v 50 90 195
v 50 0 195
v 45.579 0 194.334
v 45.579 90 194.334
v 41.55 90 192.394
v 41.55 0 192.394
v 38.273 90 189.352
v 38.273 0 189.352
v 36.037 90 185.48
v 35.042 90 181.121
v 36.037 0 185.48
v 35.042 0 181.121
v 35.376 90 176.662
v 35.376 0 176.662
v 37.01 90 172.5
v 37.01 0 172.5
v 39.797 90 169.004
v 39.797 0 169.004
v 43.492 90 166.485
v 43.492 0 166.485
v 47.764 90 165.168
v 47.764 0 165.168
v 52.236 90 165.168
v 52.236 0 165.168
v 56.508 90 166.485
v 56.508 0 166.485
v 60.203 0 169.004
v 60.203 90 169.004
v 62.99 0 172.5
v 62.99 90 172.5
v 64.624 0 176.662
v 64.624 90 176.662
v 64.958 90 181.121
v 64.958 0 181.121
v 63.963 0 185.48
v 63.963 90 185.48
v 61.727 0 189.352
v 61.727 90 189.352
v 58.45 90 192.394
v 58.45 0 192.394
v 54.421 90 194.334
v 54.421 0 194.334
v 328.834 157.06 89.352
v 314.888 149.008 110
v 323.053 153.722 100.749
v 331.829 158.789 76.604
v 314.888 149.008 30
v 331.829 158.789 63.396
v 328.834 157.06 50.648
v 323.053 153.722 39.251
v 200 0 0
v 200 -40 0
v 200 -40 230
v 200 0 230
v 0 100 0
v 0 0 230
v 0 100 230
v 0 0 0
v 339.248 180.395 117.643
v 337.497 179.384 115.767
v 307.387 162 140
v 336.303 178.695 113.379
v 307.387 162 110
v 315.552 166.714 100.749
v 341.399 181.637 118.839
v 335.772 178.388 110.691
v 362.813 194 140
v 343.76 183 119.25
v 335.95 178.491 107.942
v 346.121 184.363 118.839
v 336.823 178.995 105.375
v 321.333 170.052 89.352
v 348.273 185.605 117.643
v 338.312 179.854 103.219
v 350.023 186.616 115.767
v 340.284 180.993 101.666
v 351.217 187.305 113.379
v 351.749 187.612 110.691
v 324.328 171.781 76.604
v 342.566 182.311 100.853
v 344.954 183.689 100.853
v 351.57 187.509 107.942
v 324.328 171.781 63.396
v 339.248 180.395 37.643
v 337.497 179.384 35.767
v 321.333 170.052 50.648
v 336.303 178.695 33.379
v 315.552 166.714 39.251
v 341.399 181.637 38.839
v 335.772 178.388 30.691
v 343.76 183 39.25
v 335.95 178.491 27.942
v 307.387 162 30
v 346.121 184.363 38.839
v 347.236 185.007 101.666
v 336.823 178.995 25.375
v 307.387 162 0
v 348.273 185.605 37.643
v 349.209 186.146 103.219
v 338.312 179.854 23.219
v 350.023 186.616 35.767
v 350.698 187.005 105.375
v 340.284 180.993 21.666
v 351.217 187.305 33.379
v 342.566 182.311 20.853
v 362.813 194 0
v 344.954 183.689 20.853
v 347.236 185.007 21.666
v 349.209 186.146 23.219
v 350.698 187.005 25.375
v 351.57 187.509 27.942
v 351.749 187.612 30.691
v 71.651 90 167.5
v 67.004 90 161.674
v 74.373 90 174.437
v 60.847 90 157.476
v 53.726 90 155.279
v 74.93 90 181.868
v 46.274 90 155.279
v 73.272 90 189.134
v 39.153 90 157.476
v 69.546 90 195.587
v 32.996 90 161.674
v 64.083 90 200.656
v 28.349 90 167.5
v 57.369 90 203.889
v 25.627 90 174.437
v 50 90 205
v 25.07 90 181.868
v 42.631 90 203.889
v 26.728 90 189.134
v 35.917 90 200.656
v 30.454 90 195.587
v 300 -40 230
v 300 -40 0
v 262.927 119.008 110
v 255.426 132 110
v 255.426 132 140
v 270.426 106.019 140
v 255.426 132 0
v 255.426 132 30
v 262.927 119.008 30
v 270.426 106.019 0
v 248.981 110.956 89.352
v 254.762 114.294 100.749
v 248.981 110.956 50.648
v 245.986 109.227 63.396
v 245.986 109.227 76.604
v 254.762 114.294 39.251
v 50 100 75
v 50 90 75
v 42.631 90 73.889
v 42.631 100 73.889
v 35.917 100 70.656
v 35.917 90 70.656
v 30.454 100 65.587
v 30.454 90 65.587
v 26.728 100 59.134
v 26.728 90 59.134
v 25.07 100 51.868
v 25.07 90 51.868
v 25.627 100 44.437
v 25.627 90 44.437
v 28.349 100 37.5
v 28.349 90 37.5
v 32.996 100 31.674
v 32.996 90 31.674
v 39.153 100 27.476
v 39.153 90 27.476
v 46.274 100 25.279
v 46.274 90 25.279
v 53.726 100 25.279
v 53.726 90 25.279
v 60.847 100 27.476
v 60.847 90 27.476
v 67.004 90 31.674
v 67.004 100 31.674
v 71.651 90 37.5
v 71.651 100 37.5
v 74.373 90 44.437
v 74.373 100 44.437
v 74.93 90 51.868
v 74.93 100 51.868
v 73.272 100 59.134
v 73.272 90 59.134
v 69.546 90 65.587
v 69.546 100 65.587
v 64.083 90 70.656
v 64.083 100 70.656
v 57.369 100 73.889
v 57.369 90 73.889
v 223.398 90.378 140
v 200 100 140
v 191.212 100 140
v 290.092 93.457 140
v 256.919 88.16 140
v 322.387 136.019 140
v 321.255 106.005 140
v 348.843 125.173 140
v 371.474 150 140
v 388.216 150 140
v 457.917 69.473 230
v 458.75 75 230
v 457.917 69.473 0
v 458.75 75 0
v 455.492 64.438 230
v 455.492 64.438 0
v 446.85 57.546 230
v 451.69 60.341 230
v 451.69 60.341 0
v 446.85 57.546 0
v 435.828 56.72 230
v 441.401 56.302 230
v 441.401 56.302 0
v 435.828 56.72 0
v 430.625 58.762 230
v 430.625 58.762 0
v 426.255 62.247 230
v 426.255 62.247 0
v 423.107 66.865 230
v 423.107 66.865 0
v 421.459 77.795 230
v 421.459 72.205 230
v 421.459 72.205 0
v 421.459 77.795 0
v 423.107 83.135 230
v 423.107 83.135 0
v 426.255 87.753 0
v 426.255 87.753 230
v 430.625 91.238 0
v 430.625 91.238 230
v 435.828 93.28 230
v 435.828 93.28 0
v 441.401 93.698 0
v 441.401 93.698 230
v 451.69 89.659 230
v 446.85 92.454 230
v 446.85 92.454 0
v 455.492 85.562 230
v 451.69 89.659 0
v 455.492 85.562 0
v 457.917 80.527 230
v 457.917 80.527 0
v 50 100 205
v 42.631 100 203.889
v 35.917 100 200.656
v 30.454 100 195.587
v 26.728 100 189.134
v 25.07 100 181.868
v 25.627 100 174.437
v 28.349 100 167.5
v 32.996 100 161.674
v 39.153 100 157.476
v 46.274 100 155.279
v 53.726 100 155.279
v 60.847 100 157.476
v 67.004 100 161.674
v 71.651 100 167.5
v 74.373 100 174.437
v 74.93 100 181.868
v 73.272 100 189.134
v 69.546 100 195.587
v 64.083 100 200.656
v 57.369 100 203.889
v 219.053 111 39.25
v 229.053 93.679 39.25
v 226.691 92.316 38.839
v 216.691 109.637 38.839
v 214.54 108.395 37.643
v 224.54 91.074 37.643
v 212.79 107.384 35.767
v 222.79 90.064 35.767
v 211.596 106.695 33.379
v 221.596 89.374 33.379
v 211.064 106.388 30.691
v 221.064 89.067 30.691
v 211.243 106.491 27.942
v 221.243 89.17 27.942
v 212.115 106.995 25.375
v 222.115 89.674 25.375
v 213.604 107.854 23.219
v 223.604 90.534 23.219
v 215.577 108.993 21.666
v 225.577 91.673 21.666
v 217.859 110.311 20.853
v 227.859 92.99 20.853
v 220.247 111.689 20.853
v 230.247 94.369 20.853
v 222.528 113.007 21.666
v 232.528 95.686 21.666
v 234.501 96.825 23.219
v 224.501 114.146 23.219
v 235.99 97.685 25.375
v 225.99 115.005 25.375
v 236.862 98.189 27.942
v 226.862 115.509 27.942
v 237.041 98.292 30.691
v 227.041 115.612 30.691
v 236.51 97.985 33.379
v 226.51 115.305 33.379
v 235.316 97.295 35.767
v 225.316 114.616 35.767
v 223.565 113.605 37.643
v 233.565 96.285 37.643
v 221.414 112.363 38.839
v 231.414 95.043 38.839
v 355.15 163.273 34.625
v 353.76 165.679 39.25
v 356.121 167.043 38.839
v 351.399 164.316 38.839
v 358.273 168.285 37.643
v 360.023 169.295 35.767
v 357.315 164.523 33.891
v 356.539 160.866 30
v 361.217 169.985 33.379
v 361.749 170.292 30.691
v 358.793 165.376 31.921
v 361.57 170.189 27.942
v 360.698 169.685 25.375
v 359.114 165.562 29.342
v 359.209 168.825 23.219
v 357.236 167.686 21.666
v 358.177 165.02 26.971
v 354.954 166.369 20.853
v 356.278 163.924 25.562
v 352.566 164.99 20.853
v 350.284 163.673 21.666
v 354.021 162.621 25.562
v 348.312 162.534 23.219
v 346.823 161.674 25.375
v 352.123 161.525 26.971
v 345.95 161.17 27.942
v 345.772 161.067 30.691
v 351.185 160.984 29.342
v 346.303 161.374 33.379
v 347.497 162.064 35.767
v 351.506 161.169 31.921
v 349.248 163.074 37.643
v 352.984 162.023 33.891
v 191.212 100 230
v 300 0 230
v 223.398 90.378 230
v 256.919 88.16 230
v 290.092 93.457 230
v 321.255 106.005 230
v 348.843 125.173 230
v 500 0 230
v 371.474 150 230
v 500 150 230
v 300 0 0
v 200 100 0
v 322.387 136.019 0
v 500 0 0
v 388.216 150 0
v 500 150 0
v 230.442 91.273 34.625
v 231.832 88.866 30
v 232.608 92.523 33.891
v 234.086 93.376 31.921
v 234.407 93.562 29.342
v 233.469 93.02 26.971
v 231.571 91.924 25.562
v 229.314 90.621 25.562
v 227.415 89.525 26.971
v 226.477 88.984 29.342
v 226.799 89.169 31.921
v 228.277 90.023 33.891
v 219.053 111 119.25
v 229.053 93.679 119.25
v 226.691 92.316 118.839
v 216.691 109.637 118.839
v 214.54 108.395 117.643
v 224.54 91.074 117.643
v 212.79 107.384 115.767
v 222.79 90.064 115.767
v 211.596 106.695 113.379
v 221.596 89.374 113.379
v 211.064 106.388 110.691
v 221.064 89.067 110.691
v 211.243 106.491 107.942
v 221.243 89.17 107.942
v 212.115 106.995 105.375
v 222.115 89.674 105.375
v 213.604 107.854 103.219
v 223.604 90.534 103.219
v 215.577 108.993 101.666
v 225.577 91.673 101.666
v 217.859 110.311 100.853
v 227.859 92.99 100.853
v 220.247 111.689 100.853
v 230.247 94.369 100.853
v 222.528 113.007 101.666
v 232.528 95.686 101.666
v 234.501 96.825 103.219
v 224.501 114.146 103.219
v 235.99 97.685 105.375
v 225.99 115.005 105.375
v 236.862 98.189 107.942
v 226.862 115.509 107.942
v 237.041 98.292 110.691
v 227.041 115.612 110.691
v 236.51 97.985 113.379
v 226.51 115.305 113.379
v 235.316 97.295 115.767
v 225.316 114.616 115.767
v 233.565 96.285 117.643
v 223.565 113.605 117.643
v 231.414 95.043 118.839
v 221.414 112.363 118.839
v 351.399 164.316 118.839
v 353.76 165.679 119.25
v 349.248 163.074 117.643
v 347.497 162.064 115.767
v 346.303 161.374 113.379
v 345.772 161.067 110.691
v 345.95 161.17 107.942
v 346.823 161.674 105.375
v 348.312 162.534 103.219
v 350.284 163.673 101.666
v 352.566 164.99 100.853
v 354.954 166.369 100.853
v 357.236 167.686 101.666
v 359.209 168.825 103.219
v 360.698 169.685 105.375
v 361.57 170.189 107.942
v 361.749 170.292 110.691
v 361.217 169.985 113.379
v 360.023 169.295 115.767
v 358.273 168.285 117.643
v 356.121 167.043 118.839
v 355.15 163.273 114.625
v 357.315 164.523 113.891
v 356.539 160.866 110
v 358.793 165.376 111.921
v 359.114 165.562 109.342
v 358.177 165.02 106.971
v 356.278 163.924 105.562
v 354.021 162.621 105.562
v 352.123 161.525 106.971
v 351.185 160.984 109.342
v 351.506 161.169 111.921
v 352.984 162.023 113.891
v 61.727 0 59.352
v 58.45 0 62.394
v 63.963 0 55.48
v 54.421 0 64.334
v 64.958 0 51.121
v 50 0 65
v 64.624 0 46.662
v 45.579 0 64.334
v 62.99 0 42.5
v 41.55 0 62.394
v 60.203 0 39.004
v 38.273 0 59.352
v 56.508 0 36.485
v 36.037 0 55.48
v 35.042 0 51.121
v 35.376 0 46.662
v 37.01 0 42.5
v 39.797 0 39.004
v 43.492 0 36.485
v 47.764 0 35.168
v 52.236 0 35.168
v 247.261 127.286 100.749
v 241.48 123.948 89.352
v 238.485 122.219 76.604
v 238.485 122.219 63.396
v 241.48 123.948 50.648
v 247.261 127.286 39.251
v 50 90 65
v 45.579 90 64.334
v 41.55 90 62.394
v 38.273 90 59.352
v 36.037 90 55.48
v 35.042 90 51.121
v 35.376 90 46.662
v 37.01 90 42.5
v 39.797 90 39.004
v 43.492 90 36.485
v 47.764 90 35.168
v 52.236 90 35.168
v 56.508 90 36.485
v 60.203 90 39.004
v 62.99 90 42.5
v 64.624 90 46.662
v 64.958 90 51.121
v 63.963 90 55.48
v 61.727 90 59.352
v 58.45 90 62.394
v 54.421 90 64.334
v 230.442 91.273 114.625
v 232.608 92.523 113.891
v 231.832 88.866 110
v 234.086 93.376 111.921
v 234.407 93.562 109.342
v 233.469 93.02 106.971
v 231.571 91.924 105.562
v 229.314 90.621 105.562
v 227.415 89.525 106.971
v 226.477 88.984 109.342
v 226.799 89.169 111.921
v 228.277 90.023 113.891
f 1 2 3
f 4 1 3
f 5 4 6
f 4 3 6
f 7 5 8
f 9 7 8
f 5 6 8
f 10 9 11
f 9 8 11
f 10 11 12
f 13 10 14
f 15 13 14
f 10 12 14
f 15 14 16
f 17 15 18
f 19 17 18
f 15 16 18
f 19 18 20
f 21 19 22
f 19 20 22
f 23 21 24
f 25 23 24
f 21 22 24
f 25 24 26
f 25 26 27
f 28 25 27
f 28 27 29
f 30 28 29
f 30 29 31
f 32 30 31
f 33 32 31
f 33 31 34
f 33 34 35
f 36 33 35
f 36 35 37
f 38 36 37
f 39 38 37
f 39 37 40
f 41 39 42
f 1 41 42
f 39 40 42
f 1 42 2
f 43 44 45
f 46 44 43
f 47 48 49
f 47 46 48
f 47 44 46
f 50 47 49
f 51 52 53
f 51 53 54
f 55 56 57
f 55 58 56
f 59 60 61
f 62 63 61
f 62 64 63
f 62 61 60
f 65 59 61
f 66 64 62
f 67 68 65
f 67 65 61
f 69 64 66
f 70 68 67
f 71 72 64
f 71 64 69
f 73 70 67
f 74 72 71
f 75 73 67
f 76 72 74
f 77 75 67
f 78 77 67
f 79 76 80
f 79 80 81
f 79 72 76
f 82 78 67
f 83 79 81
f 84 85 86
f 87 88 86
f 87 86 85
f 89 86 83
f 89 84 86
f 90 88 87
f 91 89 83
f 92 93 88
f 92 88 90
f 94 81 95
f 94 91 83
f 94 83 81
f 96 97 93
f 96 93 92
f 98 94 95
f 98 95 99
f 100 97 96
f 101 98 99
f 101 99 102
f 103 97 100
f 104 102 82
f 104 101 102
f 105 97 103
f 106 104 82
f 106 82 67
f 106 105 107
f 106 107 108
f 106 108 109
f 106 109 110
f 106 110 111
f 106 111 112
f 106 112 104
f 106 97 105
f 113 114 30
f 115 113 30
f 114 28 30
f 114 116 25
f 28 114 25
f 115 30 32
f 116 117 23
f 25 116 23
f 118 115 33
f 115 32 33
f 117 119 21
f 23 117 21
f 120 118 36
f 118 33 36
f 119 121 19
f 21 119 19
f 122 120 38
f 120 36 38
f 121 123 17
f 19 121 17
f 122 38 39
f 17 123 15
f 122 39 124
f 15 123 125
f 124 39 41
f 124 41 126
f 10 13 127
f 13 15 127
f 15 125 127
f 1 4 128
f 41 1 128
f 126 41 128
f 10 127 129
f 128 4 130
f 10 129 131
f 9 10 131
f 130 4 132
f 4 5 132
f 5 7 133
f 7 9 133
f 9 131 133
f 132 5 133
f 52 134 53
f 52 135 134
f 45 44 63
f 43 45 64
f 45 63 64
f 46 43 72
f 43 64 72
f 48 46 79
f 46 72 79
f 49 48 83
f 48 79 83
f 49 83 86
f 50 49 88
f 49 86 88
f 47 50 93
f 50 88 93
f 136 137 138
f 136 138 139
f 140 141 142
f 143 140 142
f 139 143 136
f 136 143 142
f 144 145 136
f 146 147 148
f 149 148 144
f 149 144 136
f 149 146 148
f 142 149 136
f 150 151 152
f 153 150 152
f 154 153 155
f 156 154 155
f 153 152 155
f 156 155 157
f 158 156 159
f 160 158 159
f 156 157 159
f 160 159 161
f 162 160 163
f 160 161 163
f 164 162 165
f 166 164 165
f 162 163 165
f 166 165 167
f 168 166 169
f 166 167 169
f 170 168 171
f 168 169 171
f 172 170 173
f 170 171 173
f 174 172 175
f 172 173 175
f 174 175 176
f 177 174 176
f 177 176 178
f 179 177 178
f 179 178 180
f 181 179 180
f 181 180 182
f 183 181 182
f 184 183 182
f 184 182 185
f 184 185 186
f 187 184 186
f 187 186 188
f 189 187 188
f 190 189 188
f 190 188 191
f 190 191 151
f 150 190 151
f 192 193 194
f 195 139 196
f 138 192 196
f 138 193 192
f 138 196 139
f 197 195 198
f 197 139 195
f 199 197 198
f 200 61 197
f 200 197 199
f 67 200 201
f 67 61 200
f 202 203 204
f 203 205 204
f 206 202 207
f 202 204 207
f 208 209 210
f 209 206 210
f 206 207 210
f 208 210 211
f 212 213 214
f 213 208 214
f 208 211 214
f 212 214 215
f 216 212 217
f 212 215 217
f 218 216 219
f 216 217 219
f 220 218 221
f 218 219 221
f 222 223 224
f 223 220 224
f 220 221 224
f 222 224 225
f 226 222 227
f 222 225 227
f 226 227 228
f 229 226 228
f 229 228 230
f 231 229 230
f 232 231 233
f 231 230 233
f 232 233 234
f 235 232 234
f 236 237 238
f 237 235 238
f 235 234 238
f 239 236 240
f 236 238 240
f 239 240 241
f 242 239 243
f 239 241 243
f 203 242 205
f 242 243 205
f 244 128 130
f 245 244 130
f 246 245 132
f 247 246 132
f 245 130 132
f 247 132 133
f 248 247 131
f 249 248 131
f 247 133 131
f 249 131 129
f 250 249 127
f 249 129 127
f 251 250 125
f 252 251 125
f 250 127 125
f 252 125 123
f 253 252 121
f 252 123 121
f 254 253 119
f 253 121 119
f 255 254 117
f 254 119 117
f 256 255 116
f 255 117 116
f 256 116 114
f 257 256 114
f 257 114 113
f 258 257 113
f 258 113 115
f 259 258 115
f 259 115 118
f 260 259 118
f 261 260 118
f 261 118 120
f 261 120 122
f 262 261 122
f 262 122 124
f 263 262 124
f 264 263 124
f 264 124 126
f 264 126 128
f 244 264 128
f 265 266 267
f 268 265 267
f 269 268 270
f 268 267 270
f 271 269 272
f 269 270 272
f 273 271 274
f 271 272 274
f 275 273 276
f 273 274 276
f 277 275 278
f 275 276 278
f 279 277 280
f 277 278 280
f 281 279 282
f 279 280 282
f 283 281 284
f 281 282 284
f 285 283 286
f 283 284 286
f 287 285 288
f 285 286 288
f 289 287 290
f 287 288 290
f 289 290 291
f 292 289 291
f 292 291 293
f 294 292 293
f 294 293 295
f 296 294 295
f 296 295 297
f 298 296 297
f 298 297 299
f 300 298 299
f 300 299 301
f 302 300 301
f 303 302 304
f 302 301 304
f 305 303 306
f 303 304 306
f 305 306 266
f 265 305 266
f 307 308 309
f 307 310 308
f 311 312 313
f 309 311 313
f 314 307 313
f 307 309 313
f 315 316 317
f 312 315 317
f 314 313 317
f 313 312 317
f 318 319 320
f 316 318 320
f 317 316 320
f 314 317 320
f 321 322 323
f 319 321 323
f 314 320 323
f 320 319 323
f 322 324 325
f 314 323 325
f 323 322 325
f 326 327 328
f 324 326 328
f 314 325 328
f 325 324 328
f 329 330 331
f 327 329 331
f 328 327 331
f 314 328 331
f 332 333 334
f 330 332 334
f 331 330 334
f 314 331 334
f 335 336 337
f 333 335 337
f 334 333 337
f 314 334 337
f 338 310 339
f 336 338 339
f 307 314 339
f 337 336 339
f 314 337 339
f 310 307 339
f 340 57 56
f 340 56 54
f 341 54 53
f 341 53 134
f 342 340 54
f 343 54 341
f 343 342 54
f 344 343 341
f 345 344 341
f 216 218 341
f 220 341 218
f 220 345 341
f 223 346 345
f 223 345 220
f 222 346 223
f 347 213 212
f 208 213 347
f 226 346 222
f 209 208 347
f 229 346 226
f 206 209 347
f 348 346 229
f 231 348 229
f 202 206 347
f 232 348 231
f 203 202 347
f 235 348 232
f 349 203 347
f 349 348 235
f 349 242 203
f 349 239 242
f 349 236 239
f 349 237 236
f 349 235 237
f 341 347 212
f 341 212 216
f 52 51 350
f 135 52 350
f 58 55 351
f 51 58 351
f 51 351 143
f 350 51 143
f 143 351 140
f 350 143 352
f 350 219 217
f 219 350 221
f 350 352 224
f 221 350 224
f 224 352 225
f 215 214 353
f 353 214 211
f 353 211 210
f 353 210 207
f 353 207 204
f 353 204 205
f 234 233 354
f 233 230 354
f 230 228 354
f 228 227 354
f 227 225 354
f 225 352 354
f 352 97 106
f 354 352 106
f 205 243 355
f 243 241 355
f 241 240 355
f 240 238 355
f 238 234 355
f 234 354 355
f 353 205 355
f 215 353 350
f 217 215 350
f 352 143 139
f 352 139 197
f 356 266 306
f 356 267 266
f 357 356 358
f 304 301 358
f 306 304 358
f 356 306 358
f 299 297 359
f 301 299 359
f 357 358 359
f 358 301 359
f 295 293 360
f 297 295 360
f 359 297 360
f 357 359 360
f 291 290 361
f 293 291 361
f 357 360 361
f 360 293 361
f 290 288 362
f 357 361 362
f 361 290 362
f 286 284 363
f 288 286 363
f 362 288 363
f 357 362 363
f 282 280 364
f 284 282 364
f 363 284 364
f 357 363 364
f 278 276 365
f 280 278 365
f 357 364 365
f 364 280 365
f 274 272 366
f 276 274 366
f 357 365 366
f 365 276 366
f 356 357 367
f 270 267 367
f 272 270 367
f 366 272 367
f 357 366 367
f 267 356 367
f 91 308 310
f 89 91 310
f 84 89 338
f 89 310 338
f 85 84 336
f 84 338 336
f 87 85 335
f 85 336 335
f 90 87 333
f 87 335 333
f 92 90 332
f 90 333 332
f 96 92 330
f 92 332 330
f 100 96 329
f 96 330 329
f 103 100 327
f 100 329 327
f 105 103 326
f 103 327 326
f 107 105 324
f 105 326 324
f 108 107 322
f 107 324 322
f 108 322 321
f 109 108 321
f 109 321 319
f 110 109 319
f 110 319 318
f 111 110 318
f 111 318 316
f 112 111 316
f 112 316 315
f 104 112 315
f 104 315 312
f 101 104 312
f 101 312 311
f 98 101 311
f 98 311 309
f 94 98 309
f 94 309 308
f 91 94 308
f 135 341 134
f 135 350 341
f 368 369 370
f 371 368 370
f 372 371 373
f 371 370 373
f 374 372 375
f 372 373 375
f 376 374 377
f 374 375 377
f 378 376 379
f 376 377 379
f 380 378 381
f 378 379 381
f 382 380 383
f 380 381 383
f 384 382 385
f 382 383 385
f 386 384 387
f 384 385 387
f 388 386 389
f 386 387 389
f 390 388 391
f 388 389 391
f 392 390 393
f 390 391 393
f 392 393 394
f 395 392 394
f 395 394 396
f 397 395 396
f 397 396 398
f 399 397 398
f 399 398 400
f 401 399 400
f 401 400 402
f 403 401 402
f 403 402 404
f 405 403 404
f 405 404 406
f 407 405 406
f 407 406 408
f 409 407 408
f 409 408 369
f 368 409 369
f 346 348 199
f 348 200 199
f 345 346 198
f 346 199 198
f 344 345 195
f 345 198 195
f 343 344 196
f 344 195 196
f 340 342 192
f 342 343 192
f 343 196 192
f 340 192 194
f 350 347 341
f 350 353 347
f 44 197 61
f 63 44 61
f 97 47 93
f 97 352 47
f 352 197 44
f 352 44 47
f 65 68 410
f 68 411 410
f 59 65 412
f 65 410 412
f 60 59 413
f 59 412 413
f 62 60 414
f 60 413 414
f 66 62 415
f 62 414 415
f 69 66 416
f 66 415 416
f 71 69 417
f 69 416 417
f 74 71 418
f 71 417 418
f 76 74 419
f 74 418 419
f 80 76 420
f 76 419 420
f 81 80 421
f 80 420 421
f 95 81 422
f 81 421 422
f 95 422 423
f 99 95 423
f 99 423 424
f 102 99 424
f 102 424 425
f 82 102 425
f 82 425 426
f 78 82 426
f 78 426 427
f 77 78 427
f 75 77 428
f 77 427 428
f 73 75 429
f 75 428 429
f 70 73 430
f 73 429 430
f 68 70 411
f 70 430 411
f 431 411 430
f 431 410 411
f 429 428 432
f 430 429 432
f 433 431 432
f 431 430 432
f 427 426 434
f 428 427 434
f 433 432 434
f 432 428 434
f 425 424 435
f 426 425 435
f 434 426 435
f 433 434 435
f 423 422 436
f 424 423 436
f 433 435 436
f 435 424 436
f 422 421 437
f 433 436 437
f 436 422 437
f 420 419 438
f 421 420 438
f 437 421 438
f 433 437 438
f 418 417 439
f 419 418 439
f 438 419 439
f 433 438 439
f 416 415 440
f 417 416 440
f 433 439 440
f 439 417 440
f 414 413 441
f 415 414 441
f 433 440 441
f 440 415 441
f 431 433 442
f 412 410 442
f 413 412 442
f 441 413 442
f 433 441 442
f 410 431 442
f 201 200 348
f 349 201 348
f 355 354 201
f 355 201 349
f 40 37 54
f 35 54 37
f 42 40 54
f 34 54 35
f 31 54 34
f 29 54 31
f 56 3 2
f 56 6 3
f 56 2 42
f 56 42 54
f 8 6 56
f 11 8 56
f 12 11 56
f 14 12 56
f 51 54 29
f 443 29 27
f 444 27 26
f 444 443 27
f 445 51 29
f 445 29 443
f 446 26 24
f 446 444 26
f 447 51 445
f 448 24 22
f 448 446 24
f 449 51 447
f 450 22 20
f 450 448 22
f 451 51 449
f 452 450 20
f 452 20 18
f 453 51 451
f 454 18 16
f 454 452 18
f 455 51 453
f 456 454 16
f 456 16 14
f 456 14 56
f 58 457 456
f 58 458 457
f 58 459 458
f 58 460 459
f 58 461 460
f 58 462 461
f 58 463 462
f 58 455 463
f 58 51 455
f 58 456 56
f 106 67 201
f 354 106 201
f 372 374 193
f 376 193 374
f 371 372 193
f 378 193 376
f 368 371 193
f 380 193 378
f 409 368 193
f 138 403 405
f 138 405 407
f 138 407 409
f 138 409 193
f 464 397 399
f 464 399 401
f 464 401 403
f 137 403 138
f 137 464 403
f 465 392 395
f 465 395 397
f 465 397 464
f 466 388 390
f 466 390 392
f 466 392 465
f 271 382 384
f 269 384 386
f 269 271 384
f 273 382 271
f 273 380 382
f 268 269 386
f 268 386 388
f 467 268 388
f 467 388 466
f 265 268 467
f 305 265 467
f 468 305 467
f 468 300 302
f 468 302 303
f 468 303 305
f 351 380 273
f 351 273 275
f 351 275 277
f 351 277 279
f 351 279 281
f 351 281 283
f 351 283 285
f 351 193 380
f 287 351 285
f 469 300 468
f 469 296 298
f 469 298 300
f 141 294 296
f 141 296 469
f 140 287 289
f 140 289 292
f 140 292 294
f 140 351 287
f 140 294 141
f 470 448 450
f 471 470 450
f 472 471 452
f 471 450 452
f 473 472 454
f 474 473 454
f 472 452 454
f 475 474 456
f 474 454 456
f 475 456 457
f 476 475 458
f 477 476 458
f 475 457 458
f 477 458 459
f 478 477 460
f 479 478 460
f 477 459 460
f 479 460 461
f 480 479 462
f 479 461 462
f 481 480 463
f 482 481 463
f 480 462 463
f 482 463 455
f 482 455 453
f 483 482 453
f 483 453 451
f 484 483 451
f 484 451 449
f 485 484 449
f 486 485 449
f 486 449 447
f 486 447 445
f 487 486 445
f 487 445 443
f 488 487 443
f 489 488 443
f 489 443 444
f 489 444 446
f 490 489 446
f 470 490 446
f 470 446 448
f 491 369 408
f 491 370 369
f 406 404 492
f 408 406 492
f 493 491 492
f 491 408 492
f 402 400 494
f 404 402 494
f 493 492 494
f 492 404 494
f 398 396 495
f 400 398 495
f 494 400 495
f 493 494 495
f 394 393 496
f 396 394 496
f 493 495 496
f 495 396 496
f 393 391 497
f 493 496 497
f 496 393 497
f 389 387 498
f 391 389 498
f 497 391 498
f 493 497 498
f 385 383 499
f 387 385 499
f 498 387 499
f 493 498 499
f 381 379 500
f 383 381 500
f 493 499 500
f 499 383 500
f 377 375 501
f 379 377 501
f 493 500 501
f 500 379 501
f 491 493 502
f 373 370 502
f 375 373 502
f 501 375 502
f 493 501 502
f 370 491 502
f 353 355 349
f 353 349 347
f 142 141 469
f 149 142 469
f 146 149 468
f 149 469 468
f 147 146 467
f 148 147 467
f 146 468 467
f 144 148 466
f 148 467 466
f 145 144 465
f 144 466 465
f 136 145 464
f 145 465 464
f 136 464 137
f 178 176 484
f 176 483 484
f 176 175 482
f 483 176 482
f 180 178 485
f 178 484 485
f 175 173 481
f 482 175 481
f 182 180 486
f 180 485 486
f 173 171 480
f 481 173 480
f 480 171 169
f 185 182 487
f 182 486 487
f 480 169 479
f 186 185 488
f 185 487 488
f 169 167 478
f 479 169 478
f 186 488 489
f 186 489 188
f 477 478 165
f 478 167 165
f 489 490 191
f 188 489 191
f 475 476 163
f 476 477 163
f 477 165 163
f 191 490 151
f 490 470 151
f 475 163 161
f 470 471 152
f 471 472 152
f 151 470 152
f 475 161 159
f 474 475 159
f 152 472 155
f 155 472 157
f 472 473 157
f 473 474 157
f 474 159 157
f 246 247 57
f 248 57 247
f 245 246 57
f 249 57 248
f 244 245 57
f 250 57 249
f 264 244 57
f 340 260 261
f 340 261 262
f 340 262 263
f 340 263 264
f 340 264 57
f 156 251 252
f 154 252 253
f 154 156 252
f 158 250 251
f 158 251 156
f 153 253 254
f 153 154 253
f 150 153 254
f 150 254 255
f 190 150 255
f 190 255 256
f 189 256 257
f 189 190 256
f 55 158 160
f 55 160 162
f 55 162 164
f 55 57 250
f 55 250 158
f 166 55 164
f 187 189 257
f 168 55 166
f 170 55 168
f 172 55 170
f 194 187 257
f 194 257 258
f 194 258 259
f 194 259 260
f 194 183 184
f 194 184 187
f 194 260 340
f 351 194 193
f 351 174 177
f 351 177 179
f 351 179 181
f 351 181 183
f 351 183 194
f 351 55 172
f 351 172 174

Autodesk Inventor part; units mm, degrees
ref_plane "YZ Plane" through (0, 0, 0) normal (1, 0, 0) x (0, 1, 0)
ref_plane "XZ Plane" through (0, 0, 0) normal (0, 1, 0) x (-1, 0, 0)
ref_plane "XY Plane" through (0, 0, 0) normal (0, 0, 1) x (1, 0, 0)
sketch "Sketch1" plane through (0, 0, 0) normal (0, 0, 1) x (1, 0, 0)
  line L0 (0, 0) -> (0, 100)
  line L1 (0, 100) -> (200, 100)
  line L2 (500, 150) -> (500, 0)
  line L3 (500, 0) -> (300, 0)
  line L4 (300, 0) -> (300, -40)
  line L5 (300, -40) -> (200, -40)
  line L6 (200, -40) -> (200, 0)
  line L7 (200, 0) -> (0, 0)
  circle A0 centre (440, 75) radius 18.75
  arc A1 (191.2122, 100) -> (371.4743, 150) centre (250, 238) ccw
  line L8 (371.4743, 150) -> (500, 150)
  line L9 (362.8128, 194) -> (388.2162, 150)
  line L10 (255.4256, 132) -> (270.4256, 106.0192)
  line L11 (270.4256, 106.0192) -> (322.3872, 136.0192)
  line L12 (322.3872, 136.0192) -> (307.3872, 162)
  line L13 (200, 100) -> (255.4256, 132)
  line L14 (307.3872, 162) -> (362.8128, 194)
  dimension "d0" = 100
  dimension "d2" = 200
  dimension "d3" = 100
  dimension "d4" = 40
  dimension "d5" = 150
  dimension "d6" = 75
  dimension "d7" = 60
  dimension "d8" = 37.5
  dimension "d10" = 250
  dimension "d11" = 200
  dimension "d12" = 138
  dimension "d13" = 150
  dimension "d15" = 188
  dimension "d16" = 60
  dimension "d17" = 30
  dimension "d18" = 30
  dimension "d19" = 500
extrude "Extrusion1" add sketch "Sketch1" along normal blind 230 contours L0 L1 A1 L8 L2 L3 L4 L5 L6 L7
extrude "Extrusion2" add sketch "Sketch1" along normal blind 140 contours L1 L13 L10 L11 L12 L14 L9 L8 A1
sketch "Sketch2" plane through (0, 100, 230) normal (0, 1, 0) x (1, 0, 0)
  line L0 (0, 230) -> (0, 0) projected
  line L1 (50, 180) -> (50, 50) construction
  point P0 (50, 115)
  point P1 (0, 115)
  dimension "d24" = 50
  dimension "d25" = 130
hole "Hole1" at (50, 100, 50) at (50, 100, 180) direction (0, -1, 0) diameter 30 depth 100 counterbore diameter 50 counterbore depth 10
sketch "Sketch3" plane through (307.3872, 162, 140) normal (-0.5, 0.8660254, 0) x (0.8660254, 0.5, 0)
  line L0 (64, 140) -> (64, 0) projected
  line L1 (-60, 140) -> (-124, 140) projected
  line L2 (-124, 140) -> (-124, 0) projected
  line L3 (-60, 0) -> (-124, 0) projected
  line L4 (-60, 140) -> (-60, 0) projected
  line L5 (0, 140) -> (-60, 140) projected
  line L6 (-60, 140) -> (-60, 0) projected
  line L7 (0, 0) -> (-60, 0) projected
  line L8 (0, 140) -> (0, 0) projected
  circle A0 centre (-30, 70) radius 50
  line L9 (-30, 0) -> (-30, 140) construction
  line L10 (64, 70) -> (-124, 70) construction
  point P0 (-347.2051, 140)
  point P1 (-102, 110)
  point P2 (-102, 30)
  point P3 (42, 110)
  point P4 (42, 30)
  dimension "d33" = 100
  dimension "d34" = 80
hole "Hole2" at (219.0526, 111, 30) at (219.0526, 111, 110) at (343.7602, 183, 30) at (343.7602, 183, 110) direction (0.5, -0.8660254, 0) diameter 18.5 depth 20 tip angle 118
extrude "Extrusion3" cut sketch "Sketch3" against normal blind 15 contours A0 L8 L4 | L4 A0 | A0 L8
properties part number "b3"
